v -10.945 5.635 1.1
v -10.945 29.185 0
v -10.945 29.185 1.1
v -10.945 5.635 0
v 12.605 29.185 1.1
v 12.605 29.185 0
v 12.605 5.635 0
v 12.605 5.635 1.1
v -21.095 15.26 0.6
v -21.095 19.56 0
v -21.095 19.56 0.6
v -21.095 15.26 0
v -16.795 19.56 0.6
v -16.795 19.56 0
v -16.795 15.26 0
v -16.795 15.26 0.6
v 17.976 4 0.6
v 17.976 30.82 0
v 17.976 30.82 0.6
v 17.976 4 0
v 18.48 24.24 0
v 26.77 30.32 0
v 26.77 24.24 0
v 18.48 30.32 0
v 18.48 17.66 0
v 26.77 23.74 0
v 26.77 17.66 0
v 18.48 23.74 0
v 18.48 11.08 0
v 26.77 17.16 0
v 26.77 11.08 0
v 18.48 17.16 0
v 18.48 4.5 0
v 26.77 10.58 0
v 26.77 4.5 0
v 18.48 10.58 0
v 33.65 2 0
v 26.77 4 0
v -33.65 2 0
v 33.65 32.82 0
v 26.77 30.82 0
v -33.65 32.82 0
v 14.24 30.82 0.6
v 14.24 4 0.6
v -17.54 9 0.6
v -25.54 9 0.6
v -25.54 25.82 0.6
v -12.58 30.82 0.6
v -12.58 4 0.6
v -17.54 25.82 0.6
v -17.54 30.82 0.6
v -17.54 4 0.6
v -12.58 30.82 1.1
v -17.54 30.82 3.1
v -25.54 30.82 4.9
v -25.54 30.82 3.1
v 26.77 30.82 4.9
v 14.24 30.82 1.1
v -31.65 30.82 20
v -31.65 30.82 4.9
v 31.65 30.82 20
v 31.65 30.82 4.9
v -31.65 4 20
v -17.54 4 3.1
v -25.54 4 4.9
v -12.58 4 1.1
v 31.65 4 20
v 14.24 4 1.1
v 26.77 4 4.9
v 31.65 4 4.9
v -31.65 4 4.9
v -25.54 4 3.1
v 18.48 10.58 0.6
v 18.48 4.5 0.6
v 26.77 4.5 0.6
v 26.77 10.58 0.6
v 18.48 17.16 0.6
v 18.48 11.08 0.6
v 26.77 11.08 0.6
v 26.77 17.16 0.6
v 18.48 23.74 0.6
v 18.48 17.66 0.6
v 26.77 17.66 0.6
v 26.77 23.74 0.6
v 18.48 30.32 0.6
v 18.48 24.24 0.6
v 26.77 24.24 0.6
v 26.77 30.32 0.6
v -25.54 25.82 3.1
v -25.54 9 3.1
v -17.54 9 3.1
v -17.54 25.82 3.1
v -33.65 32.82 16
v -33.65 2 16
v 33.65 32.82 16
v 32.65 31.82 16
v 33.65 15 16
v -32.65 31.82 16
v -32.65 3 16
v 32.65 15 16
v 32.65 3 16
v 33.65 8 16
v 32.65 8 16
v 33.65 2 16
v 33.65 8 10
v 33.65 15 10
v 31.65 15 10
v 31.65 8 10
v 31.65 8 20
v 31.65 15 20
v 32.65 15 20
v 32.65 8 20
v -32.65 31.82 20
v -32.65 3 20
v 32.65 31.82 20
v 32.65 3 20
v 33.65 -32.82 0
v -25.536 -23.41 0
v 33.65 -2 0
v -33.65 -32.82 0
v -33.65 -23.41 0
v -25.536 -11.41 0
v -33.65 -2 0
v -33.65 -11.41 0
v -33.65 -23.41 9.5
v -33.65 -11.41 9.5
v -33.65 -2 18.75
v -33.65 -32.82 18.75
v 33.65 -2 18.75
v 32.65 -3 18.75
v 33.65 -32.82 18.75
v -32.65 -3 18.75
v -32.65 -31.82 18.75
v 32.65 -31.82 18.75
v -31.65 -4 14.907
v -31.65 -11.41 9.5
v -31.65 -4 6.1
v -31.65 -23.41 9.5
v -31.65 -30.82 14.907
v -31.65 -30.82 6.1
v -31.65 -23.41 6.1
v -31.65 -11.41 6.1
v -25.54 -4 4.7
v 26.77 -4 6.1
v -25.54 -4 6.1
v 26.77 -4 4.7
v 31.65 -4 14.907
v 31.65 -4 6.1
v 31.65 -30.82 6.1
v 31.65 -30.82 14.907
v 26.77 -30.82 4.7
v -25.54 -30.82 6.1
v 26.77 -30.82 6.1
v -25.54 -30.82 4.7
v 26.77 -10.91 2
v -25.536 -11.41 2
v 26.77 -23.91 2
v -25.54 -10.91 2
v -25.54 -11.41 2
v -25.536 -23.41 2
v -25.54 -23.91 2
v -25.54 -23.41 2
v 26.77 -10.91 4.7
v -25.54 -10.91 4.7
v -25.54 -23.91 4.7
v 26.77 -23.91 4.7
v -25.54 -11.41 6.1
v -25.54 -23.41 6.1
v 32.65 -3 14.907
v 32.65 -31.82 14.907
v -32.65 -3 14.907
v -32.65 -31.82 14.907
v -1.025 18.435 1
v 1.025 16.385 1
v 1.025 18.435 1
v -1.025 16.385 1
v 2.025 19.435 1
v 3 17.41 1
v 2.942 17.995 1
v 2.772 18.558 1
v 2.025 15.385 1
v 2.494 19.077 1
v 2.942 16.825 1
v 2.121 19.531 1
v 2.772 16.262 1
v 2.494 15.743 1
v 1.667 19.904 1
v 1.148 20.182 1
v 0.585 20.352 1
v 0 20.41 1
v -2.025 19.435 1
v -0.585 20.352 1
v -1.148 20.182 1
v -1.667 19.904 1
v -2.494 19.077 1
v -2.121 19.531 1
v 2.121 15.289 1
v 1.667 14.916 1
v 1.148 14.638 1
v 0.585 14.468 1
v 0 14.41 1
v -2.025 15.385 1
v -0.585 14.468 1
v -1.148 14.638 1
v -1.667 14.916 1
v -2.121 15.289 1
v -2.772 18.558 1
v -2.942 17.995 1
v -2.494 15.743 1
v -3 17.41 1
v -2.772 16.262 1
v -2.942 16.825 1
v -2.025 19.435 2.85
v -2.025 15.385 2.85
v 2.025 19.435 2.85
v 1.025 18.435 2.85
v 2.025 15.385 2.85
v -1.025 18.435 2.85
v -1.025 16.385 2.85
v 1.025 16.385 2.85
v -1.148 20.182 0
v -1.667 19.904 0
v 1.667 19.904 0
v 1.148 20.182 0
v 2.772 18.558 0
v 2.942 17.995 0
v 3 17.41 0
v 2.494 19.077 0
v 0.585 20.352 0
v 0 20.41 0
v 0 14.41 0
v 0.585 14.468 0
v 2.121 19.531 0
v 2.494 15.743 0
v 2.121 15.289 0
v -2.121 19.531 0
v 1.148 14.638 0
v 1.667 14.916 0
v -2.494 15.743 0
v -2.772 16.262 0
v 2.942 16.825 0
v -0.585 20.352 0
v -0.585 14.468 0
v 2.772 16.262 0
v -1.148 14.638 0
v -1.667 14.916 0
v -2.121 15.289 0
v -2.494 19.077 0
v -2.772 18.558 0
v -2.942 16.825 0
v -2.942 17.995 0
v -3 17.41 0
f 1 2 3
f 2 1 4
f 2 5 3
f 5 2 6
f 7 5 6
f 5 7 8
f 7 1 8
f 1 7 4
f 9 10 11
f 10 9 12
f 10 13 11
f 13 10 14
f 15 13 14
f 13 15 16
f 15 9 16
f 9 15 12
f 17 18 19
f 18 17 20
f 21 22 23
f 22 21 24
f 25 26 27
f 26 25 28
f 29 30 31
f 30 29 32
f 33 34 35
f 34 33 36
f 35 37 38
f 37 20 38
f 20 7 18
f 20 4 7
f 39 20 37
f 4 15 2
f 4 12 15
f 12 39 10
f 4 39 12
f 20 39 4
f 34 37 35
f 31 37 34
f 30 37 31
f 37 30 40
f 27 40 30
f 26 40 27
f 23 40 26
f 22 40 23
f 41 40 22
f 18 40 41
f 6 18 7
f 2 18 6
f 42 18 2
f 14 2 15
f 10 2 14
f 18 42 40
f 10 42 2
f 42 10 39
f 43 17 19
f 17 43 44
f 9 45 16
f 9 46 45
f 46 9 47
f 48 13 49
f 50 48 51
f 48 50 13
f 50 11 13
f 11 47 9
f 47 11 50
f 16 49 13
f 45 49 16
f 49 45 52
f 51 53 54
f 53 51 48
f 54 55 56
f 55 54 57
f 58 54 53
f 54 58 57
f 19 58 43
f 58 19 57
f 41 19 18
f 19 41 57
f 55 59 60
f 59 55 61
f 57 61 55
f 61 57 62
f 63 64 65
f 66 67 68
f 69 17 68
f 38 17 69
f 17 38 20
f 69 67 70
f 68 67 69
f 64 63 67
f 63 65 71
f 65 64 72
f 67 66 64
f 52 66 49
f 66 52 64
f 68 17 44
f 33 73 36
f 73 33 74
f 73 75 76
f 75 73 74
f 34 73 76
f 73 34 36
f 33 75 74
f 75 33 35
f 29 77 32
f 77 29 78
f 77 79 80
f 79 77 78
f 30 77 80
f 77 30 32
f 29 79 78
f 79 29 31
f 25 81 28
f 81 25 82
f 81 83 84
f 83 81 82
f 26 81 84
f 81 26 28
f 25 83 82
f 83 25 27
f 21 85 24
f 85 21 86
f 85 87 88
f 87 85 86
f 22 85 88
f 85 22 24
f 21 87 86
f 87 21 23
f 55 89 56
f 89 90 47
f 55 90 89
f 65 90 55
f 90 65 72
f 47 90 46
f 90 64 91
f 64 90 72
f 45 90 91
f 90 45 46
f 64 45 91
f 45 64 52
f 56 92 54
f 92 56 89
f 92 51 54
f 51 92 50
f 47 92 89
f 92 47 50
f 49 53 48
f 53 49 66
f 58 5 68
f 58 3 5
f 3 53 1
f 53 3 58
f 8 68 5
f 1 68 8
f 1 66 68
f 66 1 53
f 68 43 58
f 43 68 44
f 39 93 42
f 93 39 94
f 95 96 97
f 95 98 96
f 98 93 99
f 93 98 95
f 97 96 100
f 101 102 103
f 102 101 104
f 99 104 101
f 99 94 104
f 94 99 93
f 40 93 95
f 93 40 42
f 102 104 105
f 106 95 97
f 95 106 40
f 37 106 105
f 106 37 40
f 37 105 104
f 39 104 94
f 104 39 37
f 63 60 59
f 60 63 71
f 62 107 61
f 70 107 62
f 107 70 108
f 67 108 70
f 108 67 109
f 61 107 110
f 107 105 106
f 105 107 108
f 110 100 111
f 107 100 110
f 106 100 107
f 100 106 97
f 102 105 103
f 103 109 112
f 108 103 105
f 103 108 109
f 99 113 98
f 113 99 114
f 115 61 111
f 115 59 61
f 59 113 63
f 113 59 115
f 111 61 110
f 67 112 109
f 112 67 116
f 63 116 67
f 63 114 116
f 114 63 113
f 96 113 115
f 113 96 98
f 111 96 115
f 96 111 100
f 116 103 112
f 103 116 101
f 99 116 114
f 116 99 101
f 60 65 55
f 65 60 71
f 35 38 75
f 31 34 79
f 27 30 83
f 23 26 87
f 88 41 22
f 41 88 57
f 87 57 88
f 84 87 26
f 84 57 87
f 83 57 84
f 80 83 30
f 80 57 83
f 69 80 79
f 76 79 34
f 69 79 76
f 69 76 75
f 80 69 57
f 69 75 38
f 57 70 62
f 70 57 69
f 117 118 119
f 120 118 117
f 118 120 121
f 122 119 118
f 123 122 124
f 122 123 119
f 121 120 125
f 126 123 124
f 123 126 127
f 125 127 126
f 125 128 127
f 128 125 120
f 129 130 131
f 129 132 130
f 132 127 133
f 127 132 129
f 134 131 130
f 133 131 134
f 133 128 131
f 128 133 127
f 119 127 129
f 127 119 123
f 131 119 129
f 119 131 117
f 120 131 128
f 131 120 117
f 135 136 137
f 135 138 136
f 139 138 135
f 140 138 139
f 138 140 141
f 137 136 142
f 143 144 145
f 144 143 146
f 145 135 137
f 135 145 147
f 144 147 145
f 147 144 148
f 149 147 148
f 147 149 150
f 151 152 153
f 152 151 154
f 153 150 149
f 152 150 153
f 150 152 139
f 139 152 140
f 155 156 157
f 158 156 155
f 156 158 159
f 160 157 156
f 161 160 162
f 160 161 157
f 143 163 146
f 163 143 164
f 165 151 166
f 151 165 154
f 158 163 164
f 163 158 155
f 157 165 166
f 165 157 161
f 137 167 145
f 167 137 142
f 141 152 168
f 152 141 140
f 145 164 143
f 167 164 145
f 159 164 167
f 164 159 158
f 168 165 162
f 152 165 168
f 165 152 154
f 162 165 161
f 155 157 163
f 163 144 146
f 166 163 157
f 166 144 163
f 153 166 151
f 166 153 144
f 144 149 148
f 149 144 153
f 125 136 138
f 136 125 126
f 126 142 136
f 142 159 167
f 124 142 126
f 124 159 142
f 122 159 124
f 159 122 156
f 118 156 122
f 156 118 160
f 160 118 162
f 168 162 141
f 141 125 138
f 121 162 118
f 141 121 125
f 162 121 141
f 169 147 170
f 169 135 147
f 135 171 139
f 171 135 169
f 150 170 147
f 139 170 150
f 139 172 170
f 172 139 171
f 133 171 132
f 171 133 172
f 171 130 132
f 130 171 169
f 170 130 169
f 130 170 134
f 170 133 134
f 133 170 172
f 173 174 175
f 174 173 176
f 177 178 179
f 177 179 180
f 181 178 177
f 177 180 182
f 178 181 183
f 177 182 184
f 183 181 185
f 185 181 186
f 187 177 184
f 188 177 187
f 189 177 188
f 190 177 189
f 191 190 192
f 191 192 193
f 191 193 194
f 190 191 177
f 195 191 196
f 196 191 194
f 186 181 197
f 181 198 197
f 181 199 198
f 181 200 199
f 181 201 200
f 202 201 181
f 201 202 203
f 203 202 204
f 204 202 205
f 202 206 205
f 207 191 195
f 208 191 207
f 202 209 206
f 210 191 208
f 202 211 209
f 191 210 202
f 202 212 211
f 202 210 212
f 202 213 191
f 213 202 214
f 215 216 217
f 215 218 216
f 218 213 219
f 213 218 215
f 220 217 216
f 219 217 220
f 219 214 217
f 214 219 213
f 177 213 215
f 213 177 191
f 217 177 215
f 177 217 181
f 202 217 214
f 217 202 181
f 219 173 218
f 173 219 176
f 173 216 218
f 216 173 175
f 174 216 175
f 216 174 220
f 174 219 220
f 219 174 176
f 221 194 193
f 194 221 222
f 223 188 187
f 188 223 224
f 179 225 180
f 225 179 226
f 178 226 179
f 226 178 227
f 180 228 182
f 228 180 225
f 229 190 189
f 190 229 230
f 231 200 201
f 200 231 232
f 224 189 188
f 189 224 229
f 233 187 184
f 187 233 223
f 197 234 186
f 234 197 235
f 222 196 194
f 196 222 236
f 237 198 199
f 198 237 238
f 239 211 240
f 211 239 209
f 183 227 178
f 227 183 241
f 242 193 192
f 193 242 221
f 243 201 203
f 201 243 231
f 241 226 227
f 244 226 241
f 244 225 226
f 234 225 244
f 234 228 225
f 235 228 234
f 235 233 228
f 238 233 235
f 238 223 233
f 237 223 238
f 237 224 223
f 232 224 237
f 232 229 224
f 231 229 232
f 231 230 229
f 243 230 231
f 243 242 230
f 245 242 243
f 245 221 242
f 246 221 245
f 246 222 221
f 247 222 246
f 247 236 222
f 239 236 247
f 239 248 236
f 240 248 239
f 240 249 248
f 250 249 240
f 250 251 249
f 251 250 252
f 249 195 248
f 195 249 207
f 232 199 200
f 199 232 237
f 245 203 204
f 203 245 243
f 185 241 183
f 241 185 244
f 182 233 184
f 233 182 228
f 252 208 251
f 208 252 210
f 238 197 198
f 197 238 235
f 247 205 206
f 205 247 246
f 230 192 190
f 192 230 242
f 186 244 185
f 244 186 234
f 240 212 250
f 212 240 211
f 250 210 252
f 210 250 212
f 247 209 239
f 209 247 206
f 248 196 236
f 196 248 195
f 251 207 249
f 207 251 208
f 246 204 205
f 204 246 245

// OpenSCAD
// Digi Dice Roller - by MrStump
/*
Notes:
- Assuming you are looking head-on to the screen, then measurements are always:
    - x = left/right on screen
    - y = up/down on screen
    - z = the screen down to the battery back
- There are 3 models mentioned
    - Top Section = the upper body piece that includes the face
    - Bottom Section = the lower body piece that has the USB opening
    - Joystick = the little joystick nub that fits onto the 5-way switch
- Looking at the side, the module sections are:
    - ScreenSection = the screen all the way down to the UPS board
    - UPSSection = the battery board only, no pin sections
    - PicoSection = Everything below the UPS board, including the pin section
- The modules are oddly sided:
    - ScreenSection is larger in the Y than any other section
    - UPSSection is larger in the X than any other section
- The general layout of the code is:
    - Logic section determined what will be built and calls the Create module to make it
    - Create generates a whole printable piece using 1 or more Parts
    - Parts are individual fascets/conceptual elements of a model
*/


/////////////////////////////////////////////
// Parameters - things to modify to easilly change the model
/////////////////////////////////////////////

/* [General] */
//What part to print
Printed_Part = "All"; //[Top Section, Bottom Section, Joystick, All, Demo]
//How thick the face is. Impact look, as well as how stiff/flimsy buttons are
Face_Thickness = 0.6;
//How thickness of the thinnest part of walls
Wall_Thickness = 2;

/* [Tolerance offset so printed parts fit better] */
//How much X (left/right) to remove for the fitted parts
X_Tollerance = 0.3;
//How much Y (top of screen/bottom of screen) to remove for the fitted parts
Y_Tollerance = 0.3;
//How much Z (screen to back of case) to remove for the fitted parts
Z_Tollerance = 0.15;










//Prevents anything below this point showing in customizer
module customizerStop(){} customizerStop();


/////////////////////////////////////////////
// Hard-coded parameters - things to modify that are calculated or more delicate
/////////////////////////////////////////////

//Epsilon, prevent exact surface overlap during cutouts
eps = 0.007;
//Level of detail on rounded edges
$fn = 32;

//Measurements for the ScreenSection
//Circuit board measurements
ScreenSection_board_x = 52.25 + X_Tollerance;
ScreenSection_board_y = 26.52 + Y_Tollerance;
ScreenSection_board_z = 4.3;
//Pins (black plastic bit that connects ScreenSection to UPSSection)
ScreenSection_pins_x = 52.25 + X_Tollerance;
ScreenSection_pins_y = 20.15 + Y_Tollerance;
ScreenSection_pins_z = 9.8 - 0.45;

//Measurements for the UPSSection
//UPS board measurements (board only, not even counting circuits sticking up)
UPSSection_x = 63 + X_Tollerance;
UPSSection_y = 20.15 + Y_Tollerance;
UPSSection_z = 1.6 + Z_Tollerance;

//Max dimensions of interior space (where pico sits)
interiorMax_x = UPSSection_x;
interiorMax_y = ScreenSection_board_y;

//Measurements for the PicoSection
//Circuit board and circuits
PicoSection_board_x = 52.25 + X_Tollerance;
PicoSection_board_y = 20.95 + Y_Tollerance;
PicoSection_board_z = 2.8; //was 3.5
//Pins (black plastic bit that connects UPSSection to PicoSection)
PicoSection_pins_x = 52.25 + X_Tollerance;
PicoSection_pins_y = 20.95 + Y_Tollerance;
PicoSection_pins_z = 11.25;
//Amount above pins that the USB port is in the z
PicoSection_usb = 5.5; //THIS MAY BE WRONG
//Amount of upen air above the circuity
PicoSection_airGap_x = UPSSection_x;
PicoSection_airGap_y = 13; //in the center, this is the air space left
PicoSection_airGap_z = PicoSection_usb - PicoSection_board_z;

//UPS and Screen are not centered on the X. This is the additional excess
UPStoSCREEN_left = 6.11;
UPStoSCREEN_right = 4.88;
//Offset of Screen-To-UPS (it isn't quite centered on the X)
ScreenToUPSOffset_x = UPStoSCREEN_left - UPStoSCREEN_right - 0.6 + 0.2;

//Measurements of screen cutout
screenCut_x = 23.4 + X_Tollerance/2;
screenCut_y = 23.4 + Y_Tollerance/2;

//Measurements of joystick cutout
joyCut_x = 4 + X_Tollerance;
joyCut_y = 4 + Y_Tollerance;
//Distance from edge/center the joystick is positioned
joyCutDistance_fromEdge = 6.5;
joyCutDistance_fromCenter = ScreenSection_board_x/2 - joyCutDistance_fromEdge;

//Buttons X (y defined below)
button_x = 10;

//Space between each button
buttonCutWidth = 0.5;
//Measurements for buttons
buttonSecontion_x = button_x+buttonCutWidth;
buttonSecontion_y = ScreenSection_board_y;
//Distance from edge/center for the button positions
buttonSection_fromEdge = 4;
buttonSection_fromCenter = UPSSection_x/2 - buttonSecontion_x/2 - buttonSection_fromEdge;

//Button Y (x define above)
button_y = (buttonSecontion_y - (buttonCutWidth*5)) / 4;

//Joystick padding shape (to screen board, not UPS board)
joyPad_x = 8;
joyPad_y = 5;
joyPad_z = 2.5;

//Screen padding shape
screenPad_width = (ScreenSection_board_y - screenCut_y);
screenPad_x = screenCut_x + screenPad_width;
screenPad_y = screenCut_y + screenPad_width; 
screenPad_z = 0.5;

//Top section's walls, not including part that fits to bottom section
//X and Y don't include wall thickness
topWalls_x = UPSSection_x;
topWalls_y = ScreenSection_board_y;
topWalls_z = Face_Thickness + ScreenSection_board_z + ScreenSection_pins_z + UPSSection_z;

//Power switch cutouts (there are 2, 1 for switch and 1 for reset button)
switchCutout_insetFromSide = 4;
switchCutout_x = Wall_Thickness;
switchCutout_y = 7;
switchCutout_z = 6;

//Top iece Lip that connects to bottom piece's lip
topLip_x = topWalls_x;
topLip_y = topWalls_y;
topLip_z = 4;
topLip_thickness = Wall_Thickness/2;

//PicoSection's wall measurements (x and y doesn't include wallThickness)
botWalls_x = UPSSection_x;
botWalls_y = ScreenSection_board_y;
botWalls_z = Wall_Thickness + PicoSection_airGap_z + PicoSection_board_z + PicoSection_pins_z;

//Cutout for USB
usbCutout_x = Wall_Thickness + UPStoSCREEN_left;
usbCutout_y = 12;
usbCutout_z = Wall_Thickness + PicoSection_usb + 2;

//Bottom section lip that fits to top section lip to close case
//This is a cutout, while the top section's is addative
botLip_x = botWalls_x + Wall_Thickness; //removed x_tolerance due to looseness
botLip_y = botWalls_y + Wall_Thickness; //removed y_tolerance due to looseness
botLip_z = 4 - Z_Tollerance;

//Joystick wall/thumbpad thickness thickness
joy_thickness = 1;
//Joystick connector (inner dimensions)
//Tolerance is halved to get a tight fit
joyCon_x = 1.9 + X_Tollerance/2;
joyCon_y = 1.9 + Y_Tollerance/2;
joyCon_z = 1.7 + Z_Tollerance;
//Joystick thumbpad
joyPad_d = 6;

//Thickness of walls of connector for power switch and thickness of switch
power_thickness = 1;
//Power switch connector (inner dimensions)
//XYZ are oriented as if you are looking down at the switch, instead of the screen)
powerConnector_x = 1.52 + X_Tollerance/2;
powerConnector_y = 0.62 + Y_Tollerance/2;
powerConnector_z = 3.95 - power_thickness;
//Power switch botton (surface to grab)
powerSwitch_x = powerConnector_x + power_thickness*2;
powerSwitch_y = 5.8;
powerSwitch_z = power_thickness;



/////////////////////////////////////////////
// Logic - logic that determines what is made
/////////////////////////////////////////////

if (Printed_Part == "Top Section"){
    create_topSection();
}

else if (Printed_Part == "Bottom Section"){
    create_bottomSection();
}

else if (Printed_Part == "Joystick"){
    create_joystick();
}

else if (Printed_Part == "All"){
    yOffset = interiorMax_y/2 + Wall_Thickness*2;
    translate([0,yOffset,0])
    create_topSection();
    
    translate([0,-yOffset,0])
    create_bottomSection();
    
    translate([0,yOffset,0])
    create_joystick();
}

else if (Printed_Part == "Demo"){
    bottomToTop = botWalls_z+ScreenSection_board_z+ScreenSection_pins_z+UPSSection_z+Face_Thickness+0.1;
    translate([0,0,bottomToTop])
    rotate([180,0,0])
    create_topSection();
    
    translate([0,0,0])
    create_bottomSection();
    
    xOffset = -joyCutDistance_fromCenter+ScreenToUPSOffset_x;
    zOffset = bottomToTop + joy_thickness + joyCon_z;
    translate([xOffset,0,zOffset])
    rotate([180,0,0])
    create_joystick();
}







/////////////////////////////////////////////
// Create - Generate a whole piece of model
/////////////////////////////////////////////

//Create top section of model
module create_topSection(){
    union(){
        part_face();
        part_face_wallPad("left");
        part_face_wallPad("right");
        part_face_joyPads();
        part_face_screenPad();
        part_topSection_walls();
        part_topSection_lip();
    }
}

//Creates bottom section piece
module create_bottomSection(){
    union(){
        difference(){
            union(){
                part_buttomSection_walls();
                part_bottom_plate();
                part_bottom_airgapPad();
                part_bottom_wallPad("left");
                part_bottom_wallPad("right");
            }
            part_bottom_usbCut();
            part_bottom_lipCut();
        }
    }
}

//creates little cover for joystick
module create_joystick(){
    union(){
        translate([0,0,joy_thickness])
        part_joypad_connector();
        part_joypad_thumbpad();
    }
}

//Creates little cover for power switch
//I neded up not using this cause the power switch is too flimsy
module create_powerSwitch(){
    part_powerSwitch_switch();
    translate([0,0,powerSwitch_z])
    part_powerSwitch_connector();
}




/////////////////////////////////////////////
// Parts - Elements of the models
/////////////////////////////////////////////

// Cutout for screen
module part_face_cutout_screen(){
    xSize = screenCut_x;
    ySize = screenCut_y;
    zSize = Face_Thickness + screenPad_z + eps;
    
    //No X/Y positioning needed, screen is centered on Pi
    translate([0,0,-eps/2])
    linear_extrude(zSize)
    square([xSize, ySize], center=true);
}


// Cutout for joystick
module part_face_cutout_joystick(){
    xSize = joyCut_x;
    ySize = joyCut_y;
    zSize = Face_Thickness+eps;
    
    xPos = -( joyCutDistance_fromCenter );
    yPos = 0;
    zPos = -eps/2;
    
    translate([xPos,yPos,zPos])
    //cylinder(topWallThickness+eps, d=joy_d);
    linear_extrude(zSize)
    square([xSize,ySize], center=true);
}


// Cutout the area where buttons will go
module part_face_cutout_buttonArea(){
    xSize = buttonSecontion_x;
    ySize = buttonSecontion_y + eps;
    zSize = Face_Thickness + eps;
    
    xPos = buttonSection_fromCenter;
    yPos = 0;
    zPos = -eps/2;
    
    translate([xPos, yPos, zPos])
    linear_extrude(zSize)
    square([xSize+eps,ySize], center=true);
}

//Button creation/placement
module part_face_buttons(){
    xSize = button_x;
    ySize = button_y;
    zSize = Face_Thickness;

    //Loop that creates the buttons
    startPosY = -(buttonSecontion_y/2 - buttonCutWidth);
    for (i=[0:3]){
        xPos = buttonSection_fromCenter - xSize/2 + buttonCutWidth/2;
        yPos = startPosY + ((button_y+buttonCutWidth) * i);
        zPos = 0;
        
        translate([xPos,yPos,zPos])
        linear_extrude(zSize)
        square([xSize,ySize]);
    }
}

//Face surface (top surface of model)
module part_face_surface(){
    xSize = UPSSection_x;
    ySize = ScreenSection_board_y;
    zSize = Face_Thickness;
    
    linear_extrude(zSize)
    square([xSize, ySize], center=true);
}

//Create the face with all of its cutouts, not including the exterior wall parts
module part_face(){
    //Translate offset the x of the cutouts a bit since the screen is not eventer over UPS
    difference(){
        part_face_surface();
        translate([ScreenToUPSOffset_x,0,0]){
            part_face_cutout_screen();
            part_face_cutout_joystick();
            part_face_cutout_buttonArea();
        }
    }
    translate([ScreenToUPSOffset_x,0,0])
    part_face_buttons();
}

//Padding around the X sides of the walls, meant to fit snugly around screen's board
//Takes "left" or "right". Well, technically anything but "left" will be right
module part_face_wallPad(side){
    xSize = side == "left" ? UPStoSCREEN_left : UPStoSCREEN_right;
    ySize = ScreenSection_board_y;
    zSize = ScreenSection_board_z + Face_Thickness;
    
    xSideFlip = side == "left" ? 1 : -1;
    xPos = (xSize/2 - UPSSection_x/2) * xSideFlip;
    yPos = 0;
    zPos = 0;
    
    translate([xPos,yPos,zPos])
    linear_extrude(zSize)
    square([xSize,ySize],center=true);
}

//Padding around the joystick
module part_face_joyPads(){
    xSize = joyPad_x;
    ySize = joyPad_y;
    zSize = joyPad_z + Face_Thickness;
    
    xPos = xSize/2 - UPSSection_x/2 + UPStoSCREEN_left;
    yPos = ySize/2 - ScreenSection_board_y/2;
    zPos = 0;
    
    //pad 1
    translate([xPos,yPos,zPos])
    linear_extrude(zSize)
    square([xSize,ySize],center=true);
    //pad 2
    translate([xPos,-yPos,zPos])
    linear_extrude(zSize)
    square([xSize,ySize],center=true);
}

//Padding around the screen
module part_face_screenPad(){
    xSize = screenPad_x;
    ySize = screenPad_y;
    zSize = screenPad_z + Face_Thickness;
    
    xPos = ScreenToUPSOffset_x;
    yPos = 0;
    zPos = 0;
    
    translate([xPos,yPos,zPos])
    difference(){
        //screen padding
        linear_extrude(zSize)
        square([xSize,ySize],center=true);
        //cutout of screen
        part_face_cutout_screen();
    }
}

//Wall section that fits to the base piece
module part_topSection_walls(){
    xSize = topWalls_x;
    ySize = topWalls_y;
    zSize = topWalls_z;

    difference(){
        //Outer wall area
        linear_extrude(zSize)
        square([xSize+Wall_Thickness*2, ySize+Wall_Thickness*2],center=true);
        //Cutout for where device goes
        translate([0,0,-eps/2])
        linear_extrude(zSize+eps)
        square([xSize,ySize], center=true);
        //Cutout for switches on UPS board
        part_topSection_switchCut("left");
        *part_topSection_switchCut("right");
    }
}

//Cutouts for button and switch on UPS, which are cut out of top section
module part_topSection_switchCut(side){
    xSize = switchCutout_x + eps;
    ySize = switchCutout_y;
    zSize = switchCutout_z + eps;
    
    posFlip = side == "left" ? 1 : -1;
    xPos = -(xSize/2 - topWalls_x/2 - Wall_Thickness - eps/2);
    yPos = (ySize/2 - topWalls_y/2 + switchCutout_insetFromSide) * posFlip;
    zPos = topWalls_z - zSize + eps;
    
    translate([xPos, yPos, zPos])
    linear_extrude(zSize)
    square([xSize, ySize], center=true);
}

//Create the lip that holds the top and bottom sections togther
module part_topSection_lip(){
    xSize = topLip_x;
    ySize = topLip_y;
    zSize = topLip_z;
    
    xPos = 0;
    yPos = 0;
    zPos = topWalls_z;
    
    translate([xPos,yPos,zPos])
    difference(){
        //Outer wall area
        linear_extrude(zSize)
        square([xSize+topLip_thickness*2, ySize+topLip_thickness*2],center=true);
        
        //Cutout for where device goes
        translate([0,0,-eps/2])
        linear_extrude(zSize+eps)
        square([xSize,ySize], center=true);
        
        //Cutout so there is no lip over the swlitch ports (port)
        xSize_ports = topLip_thickness + eps;
        ySize_ports = switchCutout_y;
        xPos_ports = xSize_ports/2 + topWalls_x/2 - eps/2;
        yPos_ports = ySize_ports/2 - topWalls_y/2 + switchCutout_insetFromSide;
        zPos_ports = -eps/2;
        translate([xPos_ports,yPos_ports,zPos_ports])
        linear_extrude(zSize+eps)
        square([xSize_ports,ySize_ports], center=true);
    }
}



//Create bottom plate of the model
module part_bottom_plate(){
    xSize = botWalls_x;
    ySize = botWalls_y;
    zSize = Wall_Thickness;
    
    difference(){
        //Plate
        linear_extrude(zSize)
        square([xSize, ySize], center=true);
        //Vent cutouts
        
    }
}

//Create walls of the bottom section
module part_buttomSection_walls(){
    xSize = botWalls_x;
    ySize = botWalls_y;
    zSize = botWalls_z;

    difference(){
        //Wall
        linear_extrude(zSize)
        square([xSize + Wall_Thickness*2, ySize + Wall_Thickness*2], center=true);
        
        //Inner cutout where pico goes
        translate([0,0,-eps/2])
        linear_extrude(zSize+eps)
        square([xSize, ySize], center=true);
    }
}

//Place the airgap pads to hold up the board so it doesn't rest on its bios button
module part_bottom_airgapPad(){
    plate_xSize = botWalls_x;
    plate_ySize = botWalls_y;
    plate_zSize = PicoSection_airGap_z;
    
    airgap_xSize = botWalls_x + eps;
    airgap_ySize = PicoSection_airGap_y;
    airgap_zSize = PicoSection_airGap_z + eps;
    
    zPos = Wall_Thickness;
    
    translate([0,0,zPos])
    difference(){
        //airgap plate
        linear_extrude(plate_zSize)
        square([plate_xSize, plate_ySize], center=true);
        
        //cutout for the air
        translate([0,0,-eps/2])
        linear_extrude(airgap_zSize)
        square([airgap_xSize, airgap_ySize], center=true);
    }
}


//Cutout for vents on bottom plate
module part_bottom_plate_ventCut(){
    
}

module part_bottom_usbCut(){
    xSize = usbCutout_x+eps;
    ySize = usbCutout_y;
    zSize = usbCutout_z + eps;

    xPos = xSize/2 - interiorMax_x/2 - Wall_Thickness - eps/2;
    yPos = 0;
    zPos = -eps;
    
    translate([xPos, yPos, zPos])
    linear_extrude(zSize)
    square([xSize, ySize], center=true);
}

//Padding around the X sides of the walls, meant to fit snugly around pico's board
//Takes "left" or "right". Well, technically anything but "left" will be right
module part_bottom_wallPad(side){
    xSize = side == "left" ? UPStoSCREEN_left : UPStoSCREEN_right;
    ySize = botWalls_y;
    zSize = PicoSection_usb + Face_Thickness;
    
    xSideFlip = side == "left" ? 1 : -1;
    xPos = (xSize/2 - UPSSection_x/2) * xSideFlip;
    yPos = 0;
    zPos = 0;
    
    translate([xPos,yPos,zPos])
    linear_extrude(zSize)
    square([xSize,ySize],center=true);
}

//Cutout that makes the lip that fits to the top's lip
module part_bottom_lipCut(){
    xSize = botLip_x;
    ySize = botLip_y;
    zSize = botLip_z+eps;

    xPos = 0;
    yPos = 0;
    zPos = -botLip_z + botWalls_z + eps;
    
    translate([xPos, yPos, zPos])
    linear_extrude(zSize)
    square([xSize, ySize], center=true);
}

//Joystick's connector that fits onto the joystick nub of the screen
module part_joypad_connector(){
    xSize_inner = joyCon_x;
    ySize_inner = joyCon_y;
    zSize_inner = joyCon_z + eps;
    
    xSize_outer = joyCon_x + joy_thickness*2;
    ySize_outer = joyCon_y + joy_thickness*2;
    zSize_outer = joyCon_z;
    
    difference(){
        //outer
        linear_extrude(zSize_outer)
        square([xSize_outer, ySize_outer], center=true);
        
        //inner
        translate([0,0,-eps/2])
        linear_extrude(zSize_inner)
        square([xSize_inner, ySize_inner], center=true);
    }
}

//Joystick thumbpad
module part_joypad_thumbpad(){
    diameter = joyPad_d;
    height = joy_thickness;
    
    cylinder(d=diameter, h=height);
}

//Connector that fits around the little power toggle on the UPS
module part_powerSwitch_connector(){
    xSize_inner = powerConnector_x;
    ySize_inner = powerConnector_y;
    zSize_inner = powerConnector_z;
    
    xSize_outer = powerConnector_x + power_thickness*2;
    ySize_outer = powerConnector_y + power_thickness*2;
    zSize_outer = powerConnector_x + eps;
    
    difference(){
        //outer
        linear_extrude(zSize_outer)
        square([xSize_outer,ySize_outer], center=true);
        //inner
        translate([0,0,-eps/2])
        linear_extrude(zSize_inner)
        square([xSize_inner,ySize_inner], center=true);
    }
}

//Create part of switch that is touched to toggle on/off
module part_powerSwitch_switch(){
    xSize = powerSwitch_x;
    ySize = powerSwitch_y;
    zSize = powerSwitch_z;
    
    linear_extrude(zSize)
    square([xSize, ySize], center=true);
}
